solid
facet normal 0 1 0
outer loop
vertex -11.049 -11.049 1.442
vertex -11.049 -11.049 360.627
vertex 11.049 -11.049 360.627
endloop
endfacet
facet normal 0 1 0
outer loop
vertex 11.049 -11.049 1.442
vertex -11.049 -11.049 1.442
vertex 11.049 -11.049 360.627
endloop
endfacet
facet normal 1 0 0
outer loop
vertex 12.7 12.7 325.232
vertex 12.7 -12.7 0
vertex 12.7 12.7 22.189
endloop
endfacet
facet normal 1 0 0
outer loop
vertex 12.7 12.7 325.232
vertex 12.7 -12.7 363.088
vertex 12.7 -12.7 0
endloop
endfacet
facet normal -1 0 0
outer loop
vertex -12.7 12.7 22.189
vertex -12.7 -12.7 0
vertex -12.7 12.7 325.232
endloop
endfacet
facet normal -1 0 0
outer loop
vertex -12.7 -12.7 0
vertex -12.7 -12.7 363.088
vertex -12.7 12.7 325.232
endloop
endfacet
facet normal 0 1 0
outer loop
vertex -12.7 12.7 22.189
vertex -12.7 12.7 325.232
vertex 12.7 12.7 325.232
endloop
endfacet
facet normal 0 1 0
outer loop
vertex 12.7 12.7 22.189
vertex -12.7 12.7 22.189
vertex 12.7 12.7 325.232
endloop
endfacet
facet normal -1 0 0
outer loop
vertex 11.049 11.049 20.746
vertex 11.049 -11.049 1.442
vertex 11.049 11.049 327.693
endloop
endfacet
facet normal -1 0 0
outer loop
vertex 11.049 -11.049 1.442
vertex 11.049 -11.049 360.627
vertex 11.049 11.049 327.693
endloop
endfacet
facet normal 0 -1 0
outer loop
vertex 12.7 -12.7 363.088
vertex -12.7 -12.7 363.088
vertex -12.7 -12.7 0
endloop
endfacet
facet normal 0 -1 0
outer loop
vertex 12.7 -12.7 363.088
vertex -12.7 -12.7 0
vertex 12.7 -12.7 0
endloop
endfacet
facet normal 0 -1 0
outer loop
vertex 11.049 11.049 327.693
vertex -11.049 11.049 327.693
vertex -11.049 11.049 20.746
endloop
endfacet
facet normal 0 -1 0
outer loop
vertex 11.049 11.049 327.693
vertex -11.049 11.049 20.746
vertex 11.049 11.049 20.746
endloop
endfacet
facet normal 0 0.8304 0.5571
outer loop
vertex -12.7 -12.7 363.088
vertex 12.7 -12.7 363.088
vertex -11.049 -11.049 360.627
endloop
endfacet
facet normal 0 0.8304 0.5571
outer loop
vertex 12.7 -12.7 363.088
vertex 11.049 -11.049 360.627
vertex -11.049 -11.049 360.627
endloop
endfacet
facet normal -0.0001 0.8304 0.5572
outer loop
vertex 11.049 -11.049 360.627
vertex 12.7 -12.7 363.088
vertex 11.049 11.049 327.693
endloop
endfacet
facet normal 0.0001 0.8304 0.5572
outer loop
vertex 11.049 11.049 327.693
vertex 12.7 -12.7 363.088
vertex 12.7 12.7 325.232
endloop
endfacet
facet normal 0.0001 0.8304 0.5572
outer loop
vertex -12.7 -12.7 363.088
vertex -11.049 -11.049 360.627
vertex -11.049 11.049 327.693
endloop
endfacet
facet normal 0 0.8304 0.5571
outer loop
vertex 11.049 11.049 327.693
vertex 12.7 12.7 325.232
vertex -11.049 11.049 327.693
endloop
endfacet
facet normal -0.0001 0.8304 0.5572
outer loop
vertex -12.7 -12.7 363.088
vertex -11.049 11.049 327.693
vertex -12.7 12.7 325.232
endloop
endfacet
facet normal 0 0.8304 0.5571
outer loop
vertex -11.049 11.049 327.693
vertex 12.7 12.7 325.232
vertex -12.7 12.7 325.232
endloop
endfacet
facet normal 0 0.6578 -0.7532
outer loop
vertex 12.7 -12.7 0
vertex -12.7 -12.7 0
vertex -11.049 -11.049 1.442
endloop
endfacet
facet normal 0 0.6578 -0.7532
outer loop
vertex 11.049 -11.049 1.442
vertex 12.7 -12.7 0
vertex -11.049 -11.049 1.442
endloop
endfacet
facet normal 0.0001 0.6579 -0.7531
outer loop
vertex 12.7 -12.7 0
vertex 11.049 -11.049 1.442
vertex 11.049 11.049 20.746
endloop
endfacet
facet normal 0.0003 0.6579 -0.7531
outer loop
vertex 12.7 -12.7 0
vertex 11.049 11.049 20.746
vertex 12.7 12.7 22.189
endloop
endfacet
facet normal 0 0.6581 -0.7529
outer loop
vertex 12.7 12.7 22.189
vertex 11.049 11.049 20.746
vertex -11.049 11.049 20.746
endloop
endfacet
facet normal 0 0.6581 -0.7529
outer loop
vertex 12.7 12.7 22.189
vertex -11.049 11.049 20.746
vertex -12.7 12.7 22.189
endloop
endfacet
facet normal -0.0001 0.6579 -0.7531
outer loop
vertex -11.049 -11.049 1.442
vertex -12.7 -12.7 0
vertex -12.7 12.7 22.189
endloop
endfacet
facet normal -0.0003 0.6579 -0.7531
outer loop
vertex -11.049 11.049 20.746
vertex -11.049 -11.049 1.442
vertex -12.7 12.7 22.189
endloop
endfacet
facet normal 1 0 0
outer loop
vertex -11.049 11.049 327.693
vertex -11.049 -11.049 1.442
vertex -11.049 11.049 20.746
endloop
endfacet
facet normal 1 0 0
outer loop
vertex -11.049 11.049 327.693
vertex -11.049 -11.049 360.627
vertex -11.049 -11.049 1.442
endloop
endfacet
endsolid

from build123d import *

# Parameters (mm, degrees)
SKETCH1_W           = 25.4
SKETCH1_H           = 25.4
SKETCH1_W_2         = 22.098
SKETCH1_H_2         = 22.098
BOSS_EXTRUDE1_DEPTH = 365.442999
SKETCH5_W           = 25.4
SKETCH5_H           = 25.4
CUT_EXTRUDE2_DEPTH  = 244.121497904
CUT_EXTRUDE3_DEPTH  = 26.4


with BuildPart() as part:
    # Sketch1 → Boss-Extrude1 (new body)
    with BuildSketch(Plane.XY):
        Rectangle(SKETCH1_W, SKETCH1_H)
        Rectangle(SKETCH1_W_2, SKETCH1_H_2, mode=Mode.SUBTRACT)
    extrude(amount=BOSS_EXTRUDE1_DEPTH)

    # Sketch5 → Cut-Extrude2 (cut, through all)
    with BuildSketch(Plane(origin=(0, 132.21706056, 169.900698991), x_dir=(-1, 0, 0), z_dir=(0, 0.557172611, -0.830396701))):
        Rectangle(SKETCH5_W, SKETCH5_H)
    extrude(amount=-CUT_EXTRUDE2_DEPTH, mode=Mode.SUBTRACT)

    # Sketch6 → Cut-Extrude3 (cut, through all)
    with BuildSketch(Plane.ZY.offset(12.7)):
        Polygon((0, -12.7), (25.987122875, 17.048162291), (0, 20.823213659), align=None)
    extrude(amount=-CUT_EXTRUDE3_DEPTH, mode=Mode.SUBTRACT)


solid = part.part
